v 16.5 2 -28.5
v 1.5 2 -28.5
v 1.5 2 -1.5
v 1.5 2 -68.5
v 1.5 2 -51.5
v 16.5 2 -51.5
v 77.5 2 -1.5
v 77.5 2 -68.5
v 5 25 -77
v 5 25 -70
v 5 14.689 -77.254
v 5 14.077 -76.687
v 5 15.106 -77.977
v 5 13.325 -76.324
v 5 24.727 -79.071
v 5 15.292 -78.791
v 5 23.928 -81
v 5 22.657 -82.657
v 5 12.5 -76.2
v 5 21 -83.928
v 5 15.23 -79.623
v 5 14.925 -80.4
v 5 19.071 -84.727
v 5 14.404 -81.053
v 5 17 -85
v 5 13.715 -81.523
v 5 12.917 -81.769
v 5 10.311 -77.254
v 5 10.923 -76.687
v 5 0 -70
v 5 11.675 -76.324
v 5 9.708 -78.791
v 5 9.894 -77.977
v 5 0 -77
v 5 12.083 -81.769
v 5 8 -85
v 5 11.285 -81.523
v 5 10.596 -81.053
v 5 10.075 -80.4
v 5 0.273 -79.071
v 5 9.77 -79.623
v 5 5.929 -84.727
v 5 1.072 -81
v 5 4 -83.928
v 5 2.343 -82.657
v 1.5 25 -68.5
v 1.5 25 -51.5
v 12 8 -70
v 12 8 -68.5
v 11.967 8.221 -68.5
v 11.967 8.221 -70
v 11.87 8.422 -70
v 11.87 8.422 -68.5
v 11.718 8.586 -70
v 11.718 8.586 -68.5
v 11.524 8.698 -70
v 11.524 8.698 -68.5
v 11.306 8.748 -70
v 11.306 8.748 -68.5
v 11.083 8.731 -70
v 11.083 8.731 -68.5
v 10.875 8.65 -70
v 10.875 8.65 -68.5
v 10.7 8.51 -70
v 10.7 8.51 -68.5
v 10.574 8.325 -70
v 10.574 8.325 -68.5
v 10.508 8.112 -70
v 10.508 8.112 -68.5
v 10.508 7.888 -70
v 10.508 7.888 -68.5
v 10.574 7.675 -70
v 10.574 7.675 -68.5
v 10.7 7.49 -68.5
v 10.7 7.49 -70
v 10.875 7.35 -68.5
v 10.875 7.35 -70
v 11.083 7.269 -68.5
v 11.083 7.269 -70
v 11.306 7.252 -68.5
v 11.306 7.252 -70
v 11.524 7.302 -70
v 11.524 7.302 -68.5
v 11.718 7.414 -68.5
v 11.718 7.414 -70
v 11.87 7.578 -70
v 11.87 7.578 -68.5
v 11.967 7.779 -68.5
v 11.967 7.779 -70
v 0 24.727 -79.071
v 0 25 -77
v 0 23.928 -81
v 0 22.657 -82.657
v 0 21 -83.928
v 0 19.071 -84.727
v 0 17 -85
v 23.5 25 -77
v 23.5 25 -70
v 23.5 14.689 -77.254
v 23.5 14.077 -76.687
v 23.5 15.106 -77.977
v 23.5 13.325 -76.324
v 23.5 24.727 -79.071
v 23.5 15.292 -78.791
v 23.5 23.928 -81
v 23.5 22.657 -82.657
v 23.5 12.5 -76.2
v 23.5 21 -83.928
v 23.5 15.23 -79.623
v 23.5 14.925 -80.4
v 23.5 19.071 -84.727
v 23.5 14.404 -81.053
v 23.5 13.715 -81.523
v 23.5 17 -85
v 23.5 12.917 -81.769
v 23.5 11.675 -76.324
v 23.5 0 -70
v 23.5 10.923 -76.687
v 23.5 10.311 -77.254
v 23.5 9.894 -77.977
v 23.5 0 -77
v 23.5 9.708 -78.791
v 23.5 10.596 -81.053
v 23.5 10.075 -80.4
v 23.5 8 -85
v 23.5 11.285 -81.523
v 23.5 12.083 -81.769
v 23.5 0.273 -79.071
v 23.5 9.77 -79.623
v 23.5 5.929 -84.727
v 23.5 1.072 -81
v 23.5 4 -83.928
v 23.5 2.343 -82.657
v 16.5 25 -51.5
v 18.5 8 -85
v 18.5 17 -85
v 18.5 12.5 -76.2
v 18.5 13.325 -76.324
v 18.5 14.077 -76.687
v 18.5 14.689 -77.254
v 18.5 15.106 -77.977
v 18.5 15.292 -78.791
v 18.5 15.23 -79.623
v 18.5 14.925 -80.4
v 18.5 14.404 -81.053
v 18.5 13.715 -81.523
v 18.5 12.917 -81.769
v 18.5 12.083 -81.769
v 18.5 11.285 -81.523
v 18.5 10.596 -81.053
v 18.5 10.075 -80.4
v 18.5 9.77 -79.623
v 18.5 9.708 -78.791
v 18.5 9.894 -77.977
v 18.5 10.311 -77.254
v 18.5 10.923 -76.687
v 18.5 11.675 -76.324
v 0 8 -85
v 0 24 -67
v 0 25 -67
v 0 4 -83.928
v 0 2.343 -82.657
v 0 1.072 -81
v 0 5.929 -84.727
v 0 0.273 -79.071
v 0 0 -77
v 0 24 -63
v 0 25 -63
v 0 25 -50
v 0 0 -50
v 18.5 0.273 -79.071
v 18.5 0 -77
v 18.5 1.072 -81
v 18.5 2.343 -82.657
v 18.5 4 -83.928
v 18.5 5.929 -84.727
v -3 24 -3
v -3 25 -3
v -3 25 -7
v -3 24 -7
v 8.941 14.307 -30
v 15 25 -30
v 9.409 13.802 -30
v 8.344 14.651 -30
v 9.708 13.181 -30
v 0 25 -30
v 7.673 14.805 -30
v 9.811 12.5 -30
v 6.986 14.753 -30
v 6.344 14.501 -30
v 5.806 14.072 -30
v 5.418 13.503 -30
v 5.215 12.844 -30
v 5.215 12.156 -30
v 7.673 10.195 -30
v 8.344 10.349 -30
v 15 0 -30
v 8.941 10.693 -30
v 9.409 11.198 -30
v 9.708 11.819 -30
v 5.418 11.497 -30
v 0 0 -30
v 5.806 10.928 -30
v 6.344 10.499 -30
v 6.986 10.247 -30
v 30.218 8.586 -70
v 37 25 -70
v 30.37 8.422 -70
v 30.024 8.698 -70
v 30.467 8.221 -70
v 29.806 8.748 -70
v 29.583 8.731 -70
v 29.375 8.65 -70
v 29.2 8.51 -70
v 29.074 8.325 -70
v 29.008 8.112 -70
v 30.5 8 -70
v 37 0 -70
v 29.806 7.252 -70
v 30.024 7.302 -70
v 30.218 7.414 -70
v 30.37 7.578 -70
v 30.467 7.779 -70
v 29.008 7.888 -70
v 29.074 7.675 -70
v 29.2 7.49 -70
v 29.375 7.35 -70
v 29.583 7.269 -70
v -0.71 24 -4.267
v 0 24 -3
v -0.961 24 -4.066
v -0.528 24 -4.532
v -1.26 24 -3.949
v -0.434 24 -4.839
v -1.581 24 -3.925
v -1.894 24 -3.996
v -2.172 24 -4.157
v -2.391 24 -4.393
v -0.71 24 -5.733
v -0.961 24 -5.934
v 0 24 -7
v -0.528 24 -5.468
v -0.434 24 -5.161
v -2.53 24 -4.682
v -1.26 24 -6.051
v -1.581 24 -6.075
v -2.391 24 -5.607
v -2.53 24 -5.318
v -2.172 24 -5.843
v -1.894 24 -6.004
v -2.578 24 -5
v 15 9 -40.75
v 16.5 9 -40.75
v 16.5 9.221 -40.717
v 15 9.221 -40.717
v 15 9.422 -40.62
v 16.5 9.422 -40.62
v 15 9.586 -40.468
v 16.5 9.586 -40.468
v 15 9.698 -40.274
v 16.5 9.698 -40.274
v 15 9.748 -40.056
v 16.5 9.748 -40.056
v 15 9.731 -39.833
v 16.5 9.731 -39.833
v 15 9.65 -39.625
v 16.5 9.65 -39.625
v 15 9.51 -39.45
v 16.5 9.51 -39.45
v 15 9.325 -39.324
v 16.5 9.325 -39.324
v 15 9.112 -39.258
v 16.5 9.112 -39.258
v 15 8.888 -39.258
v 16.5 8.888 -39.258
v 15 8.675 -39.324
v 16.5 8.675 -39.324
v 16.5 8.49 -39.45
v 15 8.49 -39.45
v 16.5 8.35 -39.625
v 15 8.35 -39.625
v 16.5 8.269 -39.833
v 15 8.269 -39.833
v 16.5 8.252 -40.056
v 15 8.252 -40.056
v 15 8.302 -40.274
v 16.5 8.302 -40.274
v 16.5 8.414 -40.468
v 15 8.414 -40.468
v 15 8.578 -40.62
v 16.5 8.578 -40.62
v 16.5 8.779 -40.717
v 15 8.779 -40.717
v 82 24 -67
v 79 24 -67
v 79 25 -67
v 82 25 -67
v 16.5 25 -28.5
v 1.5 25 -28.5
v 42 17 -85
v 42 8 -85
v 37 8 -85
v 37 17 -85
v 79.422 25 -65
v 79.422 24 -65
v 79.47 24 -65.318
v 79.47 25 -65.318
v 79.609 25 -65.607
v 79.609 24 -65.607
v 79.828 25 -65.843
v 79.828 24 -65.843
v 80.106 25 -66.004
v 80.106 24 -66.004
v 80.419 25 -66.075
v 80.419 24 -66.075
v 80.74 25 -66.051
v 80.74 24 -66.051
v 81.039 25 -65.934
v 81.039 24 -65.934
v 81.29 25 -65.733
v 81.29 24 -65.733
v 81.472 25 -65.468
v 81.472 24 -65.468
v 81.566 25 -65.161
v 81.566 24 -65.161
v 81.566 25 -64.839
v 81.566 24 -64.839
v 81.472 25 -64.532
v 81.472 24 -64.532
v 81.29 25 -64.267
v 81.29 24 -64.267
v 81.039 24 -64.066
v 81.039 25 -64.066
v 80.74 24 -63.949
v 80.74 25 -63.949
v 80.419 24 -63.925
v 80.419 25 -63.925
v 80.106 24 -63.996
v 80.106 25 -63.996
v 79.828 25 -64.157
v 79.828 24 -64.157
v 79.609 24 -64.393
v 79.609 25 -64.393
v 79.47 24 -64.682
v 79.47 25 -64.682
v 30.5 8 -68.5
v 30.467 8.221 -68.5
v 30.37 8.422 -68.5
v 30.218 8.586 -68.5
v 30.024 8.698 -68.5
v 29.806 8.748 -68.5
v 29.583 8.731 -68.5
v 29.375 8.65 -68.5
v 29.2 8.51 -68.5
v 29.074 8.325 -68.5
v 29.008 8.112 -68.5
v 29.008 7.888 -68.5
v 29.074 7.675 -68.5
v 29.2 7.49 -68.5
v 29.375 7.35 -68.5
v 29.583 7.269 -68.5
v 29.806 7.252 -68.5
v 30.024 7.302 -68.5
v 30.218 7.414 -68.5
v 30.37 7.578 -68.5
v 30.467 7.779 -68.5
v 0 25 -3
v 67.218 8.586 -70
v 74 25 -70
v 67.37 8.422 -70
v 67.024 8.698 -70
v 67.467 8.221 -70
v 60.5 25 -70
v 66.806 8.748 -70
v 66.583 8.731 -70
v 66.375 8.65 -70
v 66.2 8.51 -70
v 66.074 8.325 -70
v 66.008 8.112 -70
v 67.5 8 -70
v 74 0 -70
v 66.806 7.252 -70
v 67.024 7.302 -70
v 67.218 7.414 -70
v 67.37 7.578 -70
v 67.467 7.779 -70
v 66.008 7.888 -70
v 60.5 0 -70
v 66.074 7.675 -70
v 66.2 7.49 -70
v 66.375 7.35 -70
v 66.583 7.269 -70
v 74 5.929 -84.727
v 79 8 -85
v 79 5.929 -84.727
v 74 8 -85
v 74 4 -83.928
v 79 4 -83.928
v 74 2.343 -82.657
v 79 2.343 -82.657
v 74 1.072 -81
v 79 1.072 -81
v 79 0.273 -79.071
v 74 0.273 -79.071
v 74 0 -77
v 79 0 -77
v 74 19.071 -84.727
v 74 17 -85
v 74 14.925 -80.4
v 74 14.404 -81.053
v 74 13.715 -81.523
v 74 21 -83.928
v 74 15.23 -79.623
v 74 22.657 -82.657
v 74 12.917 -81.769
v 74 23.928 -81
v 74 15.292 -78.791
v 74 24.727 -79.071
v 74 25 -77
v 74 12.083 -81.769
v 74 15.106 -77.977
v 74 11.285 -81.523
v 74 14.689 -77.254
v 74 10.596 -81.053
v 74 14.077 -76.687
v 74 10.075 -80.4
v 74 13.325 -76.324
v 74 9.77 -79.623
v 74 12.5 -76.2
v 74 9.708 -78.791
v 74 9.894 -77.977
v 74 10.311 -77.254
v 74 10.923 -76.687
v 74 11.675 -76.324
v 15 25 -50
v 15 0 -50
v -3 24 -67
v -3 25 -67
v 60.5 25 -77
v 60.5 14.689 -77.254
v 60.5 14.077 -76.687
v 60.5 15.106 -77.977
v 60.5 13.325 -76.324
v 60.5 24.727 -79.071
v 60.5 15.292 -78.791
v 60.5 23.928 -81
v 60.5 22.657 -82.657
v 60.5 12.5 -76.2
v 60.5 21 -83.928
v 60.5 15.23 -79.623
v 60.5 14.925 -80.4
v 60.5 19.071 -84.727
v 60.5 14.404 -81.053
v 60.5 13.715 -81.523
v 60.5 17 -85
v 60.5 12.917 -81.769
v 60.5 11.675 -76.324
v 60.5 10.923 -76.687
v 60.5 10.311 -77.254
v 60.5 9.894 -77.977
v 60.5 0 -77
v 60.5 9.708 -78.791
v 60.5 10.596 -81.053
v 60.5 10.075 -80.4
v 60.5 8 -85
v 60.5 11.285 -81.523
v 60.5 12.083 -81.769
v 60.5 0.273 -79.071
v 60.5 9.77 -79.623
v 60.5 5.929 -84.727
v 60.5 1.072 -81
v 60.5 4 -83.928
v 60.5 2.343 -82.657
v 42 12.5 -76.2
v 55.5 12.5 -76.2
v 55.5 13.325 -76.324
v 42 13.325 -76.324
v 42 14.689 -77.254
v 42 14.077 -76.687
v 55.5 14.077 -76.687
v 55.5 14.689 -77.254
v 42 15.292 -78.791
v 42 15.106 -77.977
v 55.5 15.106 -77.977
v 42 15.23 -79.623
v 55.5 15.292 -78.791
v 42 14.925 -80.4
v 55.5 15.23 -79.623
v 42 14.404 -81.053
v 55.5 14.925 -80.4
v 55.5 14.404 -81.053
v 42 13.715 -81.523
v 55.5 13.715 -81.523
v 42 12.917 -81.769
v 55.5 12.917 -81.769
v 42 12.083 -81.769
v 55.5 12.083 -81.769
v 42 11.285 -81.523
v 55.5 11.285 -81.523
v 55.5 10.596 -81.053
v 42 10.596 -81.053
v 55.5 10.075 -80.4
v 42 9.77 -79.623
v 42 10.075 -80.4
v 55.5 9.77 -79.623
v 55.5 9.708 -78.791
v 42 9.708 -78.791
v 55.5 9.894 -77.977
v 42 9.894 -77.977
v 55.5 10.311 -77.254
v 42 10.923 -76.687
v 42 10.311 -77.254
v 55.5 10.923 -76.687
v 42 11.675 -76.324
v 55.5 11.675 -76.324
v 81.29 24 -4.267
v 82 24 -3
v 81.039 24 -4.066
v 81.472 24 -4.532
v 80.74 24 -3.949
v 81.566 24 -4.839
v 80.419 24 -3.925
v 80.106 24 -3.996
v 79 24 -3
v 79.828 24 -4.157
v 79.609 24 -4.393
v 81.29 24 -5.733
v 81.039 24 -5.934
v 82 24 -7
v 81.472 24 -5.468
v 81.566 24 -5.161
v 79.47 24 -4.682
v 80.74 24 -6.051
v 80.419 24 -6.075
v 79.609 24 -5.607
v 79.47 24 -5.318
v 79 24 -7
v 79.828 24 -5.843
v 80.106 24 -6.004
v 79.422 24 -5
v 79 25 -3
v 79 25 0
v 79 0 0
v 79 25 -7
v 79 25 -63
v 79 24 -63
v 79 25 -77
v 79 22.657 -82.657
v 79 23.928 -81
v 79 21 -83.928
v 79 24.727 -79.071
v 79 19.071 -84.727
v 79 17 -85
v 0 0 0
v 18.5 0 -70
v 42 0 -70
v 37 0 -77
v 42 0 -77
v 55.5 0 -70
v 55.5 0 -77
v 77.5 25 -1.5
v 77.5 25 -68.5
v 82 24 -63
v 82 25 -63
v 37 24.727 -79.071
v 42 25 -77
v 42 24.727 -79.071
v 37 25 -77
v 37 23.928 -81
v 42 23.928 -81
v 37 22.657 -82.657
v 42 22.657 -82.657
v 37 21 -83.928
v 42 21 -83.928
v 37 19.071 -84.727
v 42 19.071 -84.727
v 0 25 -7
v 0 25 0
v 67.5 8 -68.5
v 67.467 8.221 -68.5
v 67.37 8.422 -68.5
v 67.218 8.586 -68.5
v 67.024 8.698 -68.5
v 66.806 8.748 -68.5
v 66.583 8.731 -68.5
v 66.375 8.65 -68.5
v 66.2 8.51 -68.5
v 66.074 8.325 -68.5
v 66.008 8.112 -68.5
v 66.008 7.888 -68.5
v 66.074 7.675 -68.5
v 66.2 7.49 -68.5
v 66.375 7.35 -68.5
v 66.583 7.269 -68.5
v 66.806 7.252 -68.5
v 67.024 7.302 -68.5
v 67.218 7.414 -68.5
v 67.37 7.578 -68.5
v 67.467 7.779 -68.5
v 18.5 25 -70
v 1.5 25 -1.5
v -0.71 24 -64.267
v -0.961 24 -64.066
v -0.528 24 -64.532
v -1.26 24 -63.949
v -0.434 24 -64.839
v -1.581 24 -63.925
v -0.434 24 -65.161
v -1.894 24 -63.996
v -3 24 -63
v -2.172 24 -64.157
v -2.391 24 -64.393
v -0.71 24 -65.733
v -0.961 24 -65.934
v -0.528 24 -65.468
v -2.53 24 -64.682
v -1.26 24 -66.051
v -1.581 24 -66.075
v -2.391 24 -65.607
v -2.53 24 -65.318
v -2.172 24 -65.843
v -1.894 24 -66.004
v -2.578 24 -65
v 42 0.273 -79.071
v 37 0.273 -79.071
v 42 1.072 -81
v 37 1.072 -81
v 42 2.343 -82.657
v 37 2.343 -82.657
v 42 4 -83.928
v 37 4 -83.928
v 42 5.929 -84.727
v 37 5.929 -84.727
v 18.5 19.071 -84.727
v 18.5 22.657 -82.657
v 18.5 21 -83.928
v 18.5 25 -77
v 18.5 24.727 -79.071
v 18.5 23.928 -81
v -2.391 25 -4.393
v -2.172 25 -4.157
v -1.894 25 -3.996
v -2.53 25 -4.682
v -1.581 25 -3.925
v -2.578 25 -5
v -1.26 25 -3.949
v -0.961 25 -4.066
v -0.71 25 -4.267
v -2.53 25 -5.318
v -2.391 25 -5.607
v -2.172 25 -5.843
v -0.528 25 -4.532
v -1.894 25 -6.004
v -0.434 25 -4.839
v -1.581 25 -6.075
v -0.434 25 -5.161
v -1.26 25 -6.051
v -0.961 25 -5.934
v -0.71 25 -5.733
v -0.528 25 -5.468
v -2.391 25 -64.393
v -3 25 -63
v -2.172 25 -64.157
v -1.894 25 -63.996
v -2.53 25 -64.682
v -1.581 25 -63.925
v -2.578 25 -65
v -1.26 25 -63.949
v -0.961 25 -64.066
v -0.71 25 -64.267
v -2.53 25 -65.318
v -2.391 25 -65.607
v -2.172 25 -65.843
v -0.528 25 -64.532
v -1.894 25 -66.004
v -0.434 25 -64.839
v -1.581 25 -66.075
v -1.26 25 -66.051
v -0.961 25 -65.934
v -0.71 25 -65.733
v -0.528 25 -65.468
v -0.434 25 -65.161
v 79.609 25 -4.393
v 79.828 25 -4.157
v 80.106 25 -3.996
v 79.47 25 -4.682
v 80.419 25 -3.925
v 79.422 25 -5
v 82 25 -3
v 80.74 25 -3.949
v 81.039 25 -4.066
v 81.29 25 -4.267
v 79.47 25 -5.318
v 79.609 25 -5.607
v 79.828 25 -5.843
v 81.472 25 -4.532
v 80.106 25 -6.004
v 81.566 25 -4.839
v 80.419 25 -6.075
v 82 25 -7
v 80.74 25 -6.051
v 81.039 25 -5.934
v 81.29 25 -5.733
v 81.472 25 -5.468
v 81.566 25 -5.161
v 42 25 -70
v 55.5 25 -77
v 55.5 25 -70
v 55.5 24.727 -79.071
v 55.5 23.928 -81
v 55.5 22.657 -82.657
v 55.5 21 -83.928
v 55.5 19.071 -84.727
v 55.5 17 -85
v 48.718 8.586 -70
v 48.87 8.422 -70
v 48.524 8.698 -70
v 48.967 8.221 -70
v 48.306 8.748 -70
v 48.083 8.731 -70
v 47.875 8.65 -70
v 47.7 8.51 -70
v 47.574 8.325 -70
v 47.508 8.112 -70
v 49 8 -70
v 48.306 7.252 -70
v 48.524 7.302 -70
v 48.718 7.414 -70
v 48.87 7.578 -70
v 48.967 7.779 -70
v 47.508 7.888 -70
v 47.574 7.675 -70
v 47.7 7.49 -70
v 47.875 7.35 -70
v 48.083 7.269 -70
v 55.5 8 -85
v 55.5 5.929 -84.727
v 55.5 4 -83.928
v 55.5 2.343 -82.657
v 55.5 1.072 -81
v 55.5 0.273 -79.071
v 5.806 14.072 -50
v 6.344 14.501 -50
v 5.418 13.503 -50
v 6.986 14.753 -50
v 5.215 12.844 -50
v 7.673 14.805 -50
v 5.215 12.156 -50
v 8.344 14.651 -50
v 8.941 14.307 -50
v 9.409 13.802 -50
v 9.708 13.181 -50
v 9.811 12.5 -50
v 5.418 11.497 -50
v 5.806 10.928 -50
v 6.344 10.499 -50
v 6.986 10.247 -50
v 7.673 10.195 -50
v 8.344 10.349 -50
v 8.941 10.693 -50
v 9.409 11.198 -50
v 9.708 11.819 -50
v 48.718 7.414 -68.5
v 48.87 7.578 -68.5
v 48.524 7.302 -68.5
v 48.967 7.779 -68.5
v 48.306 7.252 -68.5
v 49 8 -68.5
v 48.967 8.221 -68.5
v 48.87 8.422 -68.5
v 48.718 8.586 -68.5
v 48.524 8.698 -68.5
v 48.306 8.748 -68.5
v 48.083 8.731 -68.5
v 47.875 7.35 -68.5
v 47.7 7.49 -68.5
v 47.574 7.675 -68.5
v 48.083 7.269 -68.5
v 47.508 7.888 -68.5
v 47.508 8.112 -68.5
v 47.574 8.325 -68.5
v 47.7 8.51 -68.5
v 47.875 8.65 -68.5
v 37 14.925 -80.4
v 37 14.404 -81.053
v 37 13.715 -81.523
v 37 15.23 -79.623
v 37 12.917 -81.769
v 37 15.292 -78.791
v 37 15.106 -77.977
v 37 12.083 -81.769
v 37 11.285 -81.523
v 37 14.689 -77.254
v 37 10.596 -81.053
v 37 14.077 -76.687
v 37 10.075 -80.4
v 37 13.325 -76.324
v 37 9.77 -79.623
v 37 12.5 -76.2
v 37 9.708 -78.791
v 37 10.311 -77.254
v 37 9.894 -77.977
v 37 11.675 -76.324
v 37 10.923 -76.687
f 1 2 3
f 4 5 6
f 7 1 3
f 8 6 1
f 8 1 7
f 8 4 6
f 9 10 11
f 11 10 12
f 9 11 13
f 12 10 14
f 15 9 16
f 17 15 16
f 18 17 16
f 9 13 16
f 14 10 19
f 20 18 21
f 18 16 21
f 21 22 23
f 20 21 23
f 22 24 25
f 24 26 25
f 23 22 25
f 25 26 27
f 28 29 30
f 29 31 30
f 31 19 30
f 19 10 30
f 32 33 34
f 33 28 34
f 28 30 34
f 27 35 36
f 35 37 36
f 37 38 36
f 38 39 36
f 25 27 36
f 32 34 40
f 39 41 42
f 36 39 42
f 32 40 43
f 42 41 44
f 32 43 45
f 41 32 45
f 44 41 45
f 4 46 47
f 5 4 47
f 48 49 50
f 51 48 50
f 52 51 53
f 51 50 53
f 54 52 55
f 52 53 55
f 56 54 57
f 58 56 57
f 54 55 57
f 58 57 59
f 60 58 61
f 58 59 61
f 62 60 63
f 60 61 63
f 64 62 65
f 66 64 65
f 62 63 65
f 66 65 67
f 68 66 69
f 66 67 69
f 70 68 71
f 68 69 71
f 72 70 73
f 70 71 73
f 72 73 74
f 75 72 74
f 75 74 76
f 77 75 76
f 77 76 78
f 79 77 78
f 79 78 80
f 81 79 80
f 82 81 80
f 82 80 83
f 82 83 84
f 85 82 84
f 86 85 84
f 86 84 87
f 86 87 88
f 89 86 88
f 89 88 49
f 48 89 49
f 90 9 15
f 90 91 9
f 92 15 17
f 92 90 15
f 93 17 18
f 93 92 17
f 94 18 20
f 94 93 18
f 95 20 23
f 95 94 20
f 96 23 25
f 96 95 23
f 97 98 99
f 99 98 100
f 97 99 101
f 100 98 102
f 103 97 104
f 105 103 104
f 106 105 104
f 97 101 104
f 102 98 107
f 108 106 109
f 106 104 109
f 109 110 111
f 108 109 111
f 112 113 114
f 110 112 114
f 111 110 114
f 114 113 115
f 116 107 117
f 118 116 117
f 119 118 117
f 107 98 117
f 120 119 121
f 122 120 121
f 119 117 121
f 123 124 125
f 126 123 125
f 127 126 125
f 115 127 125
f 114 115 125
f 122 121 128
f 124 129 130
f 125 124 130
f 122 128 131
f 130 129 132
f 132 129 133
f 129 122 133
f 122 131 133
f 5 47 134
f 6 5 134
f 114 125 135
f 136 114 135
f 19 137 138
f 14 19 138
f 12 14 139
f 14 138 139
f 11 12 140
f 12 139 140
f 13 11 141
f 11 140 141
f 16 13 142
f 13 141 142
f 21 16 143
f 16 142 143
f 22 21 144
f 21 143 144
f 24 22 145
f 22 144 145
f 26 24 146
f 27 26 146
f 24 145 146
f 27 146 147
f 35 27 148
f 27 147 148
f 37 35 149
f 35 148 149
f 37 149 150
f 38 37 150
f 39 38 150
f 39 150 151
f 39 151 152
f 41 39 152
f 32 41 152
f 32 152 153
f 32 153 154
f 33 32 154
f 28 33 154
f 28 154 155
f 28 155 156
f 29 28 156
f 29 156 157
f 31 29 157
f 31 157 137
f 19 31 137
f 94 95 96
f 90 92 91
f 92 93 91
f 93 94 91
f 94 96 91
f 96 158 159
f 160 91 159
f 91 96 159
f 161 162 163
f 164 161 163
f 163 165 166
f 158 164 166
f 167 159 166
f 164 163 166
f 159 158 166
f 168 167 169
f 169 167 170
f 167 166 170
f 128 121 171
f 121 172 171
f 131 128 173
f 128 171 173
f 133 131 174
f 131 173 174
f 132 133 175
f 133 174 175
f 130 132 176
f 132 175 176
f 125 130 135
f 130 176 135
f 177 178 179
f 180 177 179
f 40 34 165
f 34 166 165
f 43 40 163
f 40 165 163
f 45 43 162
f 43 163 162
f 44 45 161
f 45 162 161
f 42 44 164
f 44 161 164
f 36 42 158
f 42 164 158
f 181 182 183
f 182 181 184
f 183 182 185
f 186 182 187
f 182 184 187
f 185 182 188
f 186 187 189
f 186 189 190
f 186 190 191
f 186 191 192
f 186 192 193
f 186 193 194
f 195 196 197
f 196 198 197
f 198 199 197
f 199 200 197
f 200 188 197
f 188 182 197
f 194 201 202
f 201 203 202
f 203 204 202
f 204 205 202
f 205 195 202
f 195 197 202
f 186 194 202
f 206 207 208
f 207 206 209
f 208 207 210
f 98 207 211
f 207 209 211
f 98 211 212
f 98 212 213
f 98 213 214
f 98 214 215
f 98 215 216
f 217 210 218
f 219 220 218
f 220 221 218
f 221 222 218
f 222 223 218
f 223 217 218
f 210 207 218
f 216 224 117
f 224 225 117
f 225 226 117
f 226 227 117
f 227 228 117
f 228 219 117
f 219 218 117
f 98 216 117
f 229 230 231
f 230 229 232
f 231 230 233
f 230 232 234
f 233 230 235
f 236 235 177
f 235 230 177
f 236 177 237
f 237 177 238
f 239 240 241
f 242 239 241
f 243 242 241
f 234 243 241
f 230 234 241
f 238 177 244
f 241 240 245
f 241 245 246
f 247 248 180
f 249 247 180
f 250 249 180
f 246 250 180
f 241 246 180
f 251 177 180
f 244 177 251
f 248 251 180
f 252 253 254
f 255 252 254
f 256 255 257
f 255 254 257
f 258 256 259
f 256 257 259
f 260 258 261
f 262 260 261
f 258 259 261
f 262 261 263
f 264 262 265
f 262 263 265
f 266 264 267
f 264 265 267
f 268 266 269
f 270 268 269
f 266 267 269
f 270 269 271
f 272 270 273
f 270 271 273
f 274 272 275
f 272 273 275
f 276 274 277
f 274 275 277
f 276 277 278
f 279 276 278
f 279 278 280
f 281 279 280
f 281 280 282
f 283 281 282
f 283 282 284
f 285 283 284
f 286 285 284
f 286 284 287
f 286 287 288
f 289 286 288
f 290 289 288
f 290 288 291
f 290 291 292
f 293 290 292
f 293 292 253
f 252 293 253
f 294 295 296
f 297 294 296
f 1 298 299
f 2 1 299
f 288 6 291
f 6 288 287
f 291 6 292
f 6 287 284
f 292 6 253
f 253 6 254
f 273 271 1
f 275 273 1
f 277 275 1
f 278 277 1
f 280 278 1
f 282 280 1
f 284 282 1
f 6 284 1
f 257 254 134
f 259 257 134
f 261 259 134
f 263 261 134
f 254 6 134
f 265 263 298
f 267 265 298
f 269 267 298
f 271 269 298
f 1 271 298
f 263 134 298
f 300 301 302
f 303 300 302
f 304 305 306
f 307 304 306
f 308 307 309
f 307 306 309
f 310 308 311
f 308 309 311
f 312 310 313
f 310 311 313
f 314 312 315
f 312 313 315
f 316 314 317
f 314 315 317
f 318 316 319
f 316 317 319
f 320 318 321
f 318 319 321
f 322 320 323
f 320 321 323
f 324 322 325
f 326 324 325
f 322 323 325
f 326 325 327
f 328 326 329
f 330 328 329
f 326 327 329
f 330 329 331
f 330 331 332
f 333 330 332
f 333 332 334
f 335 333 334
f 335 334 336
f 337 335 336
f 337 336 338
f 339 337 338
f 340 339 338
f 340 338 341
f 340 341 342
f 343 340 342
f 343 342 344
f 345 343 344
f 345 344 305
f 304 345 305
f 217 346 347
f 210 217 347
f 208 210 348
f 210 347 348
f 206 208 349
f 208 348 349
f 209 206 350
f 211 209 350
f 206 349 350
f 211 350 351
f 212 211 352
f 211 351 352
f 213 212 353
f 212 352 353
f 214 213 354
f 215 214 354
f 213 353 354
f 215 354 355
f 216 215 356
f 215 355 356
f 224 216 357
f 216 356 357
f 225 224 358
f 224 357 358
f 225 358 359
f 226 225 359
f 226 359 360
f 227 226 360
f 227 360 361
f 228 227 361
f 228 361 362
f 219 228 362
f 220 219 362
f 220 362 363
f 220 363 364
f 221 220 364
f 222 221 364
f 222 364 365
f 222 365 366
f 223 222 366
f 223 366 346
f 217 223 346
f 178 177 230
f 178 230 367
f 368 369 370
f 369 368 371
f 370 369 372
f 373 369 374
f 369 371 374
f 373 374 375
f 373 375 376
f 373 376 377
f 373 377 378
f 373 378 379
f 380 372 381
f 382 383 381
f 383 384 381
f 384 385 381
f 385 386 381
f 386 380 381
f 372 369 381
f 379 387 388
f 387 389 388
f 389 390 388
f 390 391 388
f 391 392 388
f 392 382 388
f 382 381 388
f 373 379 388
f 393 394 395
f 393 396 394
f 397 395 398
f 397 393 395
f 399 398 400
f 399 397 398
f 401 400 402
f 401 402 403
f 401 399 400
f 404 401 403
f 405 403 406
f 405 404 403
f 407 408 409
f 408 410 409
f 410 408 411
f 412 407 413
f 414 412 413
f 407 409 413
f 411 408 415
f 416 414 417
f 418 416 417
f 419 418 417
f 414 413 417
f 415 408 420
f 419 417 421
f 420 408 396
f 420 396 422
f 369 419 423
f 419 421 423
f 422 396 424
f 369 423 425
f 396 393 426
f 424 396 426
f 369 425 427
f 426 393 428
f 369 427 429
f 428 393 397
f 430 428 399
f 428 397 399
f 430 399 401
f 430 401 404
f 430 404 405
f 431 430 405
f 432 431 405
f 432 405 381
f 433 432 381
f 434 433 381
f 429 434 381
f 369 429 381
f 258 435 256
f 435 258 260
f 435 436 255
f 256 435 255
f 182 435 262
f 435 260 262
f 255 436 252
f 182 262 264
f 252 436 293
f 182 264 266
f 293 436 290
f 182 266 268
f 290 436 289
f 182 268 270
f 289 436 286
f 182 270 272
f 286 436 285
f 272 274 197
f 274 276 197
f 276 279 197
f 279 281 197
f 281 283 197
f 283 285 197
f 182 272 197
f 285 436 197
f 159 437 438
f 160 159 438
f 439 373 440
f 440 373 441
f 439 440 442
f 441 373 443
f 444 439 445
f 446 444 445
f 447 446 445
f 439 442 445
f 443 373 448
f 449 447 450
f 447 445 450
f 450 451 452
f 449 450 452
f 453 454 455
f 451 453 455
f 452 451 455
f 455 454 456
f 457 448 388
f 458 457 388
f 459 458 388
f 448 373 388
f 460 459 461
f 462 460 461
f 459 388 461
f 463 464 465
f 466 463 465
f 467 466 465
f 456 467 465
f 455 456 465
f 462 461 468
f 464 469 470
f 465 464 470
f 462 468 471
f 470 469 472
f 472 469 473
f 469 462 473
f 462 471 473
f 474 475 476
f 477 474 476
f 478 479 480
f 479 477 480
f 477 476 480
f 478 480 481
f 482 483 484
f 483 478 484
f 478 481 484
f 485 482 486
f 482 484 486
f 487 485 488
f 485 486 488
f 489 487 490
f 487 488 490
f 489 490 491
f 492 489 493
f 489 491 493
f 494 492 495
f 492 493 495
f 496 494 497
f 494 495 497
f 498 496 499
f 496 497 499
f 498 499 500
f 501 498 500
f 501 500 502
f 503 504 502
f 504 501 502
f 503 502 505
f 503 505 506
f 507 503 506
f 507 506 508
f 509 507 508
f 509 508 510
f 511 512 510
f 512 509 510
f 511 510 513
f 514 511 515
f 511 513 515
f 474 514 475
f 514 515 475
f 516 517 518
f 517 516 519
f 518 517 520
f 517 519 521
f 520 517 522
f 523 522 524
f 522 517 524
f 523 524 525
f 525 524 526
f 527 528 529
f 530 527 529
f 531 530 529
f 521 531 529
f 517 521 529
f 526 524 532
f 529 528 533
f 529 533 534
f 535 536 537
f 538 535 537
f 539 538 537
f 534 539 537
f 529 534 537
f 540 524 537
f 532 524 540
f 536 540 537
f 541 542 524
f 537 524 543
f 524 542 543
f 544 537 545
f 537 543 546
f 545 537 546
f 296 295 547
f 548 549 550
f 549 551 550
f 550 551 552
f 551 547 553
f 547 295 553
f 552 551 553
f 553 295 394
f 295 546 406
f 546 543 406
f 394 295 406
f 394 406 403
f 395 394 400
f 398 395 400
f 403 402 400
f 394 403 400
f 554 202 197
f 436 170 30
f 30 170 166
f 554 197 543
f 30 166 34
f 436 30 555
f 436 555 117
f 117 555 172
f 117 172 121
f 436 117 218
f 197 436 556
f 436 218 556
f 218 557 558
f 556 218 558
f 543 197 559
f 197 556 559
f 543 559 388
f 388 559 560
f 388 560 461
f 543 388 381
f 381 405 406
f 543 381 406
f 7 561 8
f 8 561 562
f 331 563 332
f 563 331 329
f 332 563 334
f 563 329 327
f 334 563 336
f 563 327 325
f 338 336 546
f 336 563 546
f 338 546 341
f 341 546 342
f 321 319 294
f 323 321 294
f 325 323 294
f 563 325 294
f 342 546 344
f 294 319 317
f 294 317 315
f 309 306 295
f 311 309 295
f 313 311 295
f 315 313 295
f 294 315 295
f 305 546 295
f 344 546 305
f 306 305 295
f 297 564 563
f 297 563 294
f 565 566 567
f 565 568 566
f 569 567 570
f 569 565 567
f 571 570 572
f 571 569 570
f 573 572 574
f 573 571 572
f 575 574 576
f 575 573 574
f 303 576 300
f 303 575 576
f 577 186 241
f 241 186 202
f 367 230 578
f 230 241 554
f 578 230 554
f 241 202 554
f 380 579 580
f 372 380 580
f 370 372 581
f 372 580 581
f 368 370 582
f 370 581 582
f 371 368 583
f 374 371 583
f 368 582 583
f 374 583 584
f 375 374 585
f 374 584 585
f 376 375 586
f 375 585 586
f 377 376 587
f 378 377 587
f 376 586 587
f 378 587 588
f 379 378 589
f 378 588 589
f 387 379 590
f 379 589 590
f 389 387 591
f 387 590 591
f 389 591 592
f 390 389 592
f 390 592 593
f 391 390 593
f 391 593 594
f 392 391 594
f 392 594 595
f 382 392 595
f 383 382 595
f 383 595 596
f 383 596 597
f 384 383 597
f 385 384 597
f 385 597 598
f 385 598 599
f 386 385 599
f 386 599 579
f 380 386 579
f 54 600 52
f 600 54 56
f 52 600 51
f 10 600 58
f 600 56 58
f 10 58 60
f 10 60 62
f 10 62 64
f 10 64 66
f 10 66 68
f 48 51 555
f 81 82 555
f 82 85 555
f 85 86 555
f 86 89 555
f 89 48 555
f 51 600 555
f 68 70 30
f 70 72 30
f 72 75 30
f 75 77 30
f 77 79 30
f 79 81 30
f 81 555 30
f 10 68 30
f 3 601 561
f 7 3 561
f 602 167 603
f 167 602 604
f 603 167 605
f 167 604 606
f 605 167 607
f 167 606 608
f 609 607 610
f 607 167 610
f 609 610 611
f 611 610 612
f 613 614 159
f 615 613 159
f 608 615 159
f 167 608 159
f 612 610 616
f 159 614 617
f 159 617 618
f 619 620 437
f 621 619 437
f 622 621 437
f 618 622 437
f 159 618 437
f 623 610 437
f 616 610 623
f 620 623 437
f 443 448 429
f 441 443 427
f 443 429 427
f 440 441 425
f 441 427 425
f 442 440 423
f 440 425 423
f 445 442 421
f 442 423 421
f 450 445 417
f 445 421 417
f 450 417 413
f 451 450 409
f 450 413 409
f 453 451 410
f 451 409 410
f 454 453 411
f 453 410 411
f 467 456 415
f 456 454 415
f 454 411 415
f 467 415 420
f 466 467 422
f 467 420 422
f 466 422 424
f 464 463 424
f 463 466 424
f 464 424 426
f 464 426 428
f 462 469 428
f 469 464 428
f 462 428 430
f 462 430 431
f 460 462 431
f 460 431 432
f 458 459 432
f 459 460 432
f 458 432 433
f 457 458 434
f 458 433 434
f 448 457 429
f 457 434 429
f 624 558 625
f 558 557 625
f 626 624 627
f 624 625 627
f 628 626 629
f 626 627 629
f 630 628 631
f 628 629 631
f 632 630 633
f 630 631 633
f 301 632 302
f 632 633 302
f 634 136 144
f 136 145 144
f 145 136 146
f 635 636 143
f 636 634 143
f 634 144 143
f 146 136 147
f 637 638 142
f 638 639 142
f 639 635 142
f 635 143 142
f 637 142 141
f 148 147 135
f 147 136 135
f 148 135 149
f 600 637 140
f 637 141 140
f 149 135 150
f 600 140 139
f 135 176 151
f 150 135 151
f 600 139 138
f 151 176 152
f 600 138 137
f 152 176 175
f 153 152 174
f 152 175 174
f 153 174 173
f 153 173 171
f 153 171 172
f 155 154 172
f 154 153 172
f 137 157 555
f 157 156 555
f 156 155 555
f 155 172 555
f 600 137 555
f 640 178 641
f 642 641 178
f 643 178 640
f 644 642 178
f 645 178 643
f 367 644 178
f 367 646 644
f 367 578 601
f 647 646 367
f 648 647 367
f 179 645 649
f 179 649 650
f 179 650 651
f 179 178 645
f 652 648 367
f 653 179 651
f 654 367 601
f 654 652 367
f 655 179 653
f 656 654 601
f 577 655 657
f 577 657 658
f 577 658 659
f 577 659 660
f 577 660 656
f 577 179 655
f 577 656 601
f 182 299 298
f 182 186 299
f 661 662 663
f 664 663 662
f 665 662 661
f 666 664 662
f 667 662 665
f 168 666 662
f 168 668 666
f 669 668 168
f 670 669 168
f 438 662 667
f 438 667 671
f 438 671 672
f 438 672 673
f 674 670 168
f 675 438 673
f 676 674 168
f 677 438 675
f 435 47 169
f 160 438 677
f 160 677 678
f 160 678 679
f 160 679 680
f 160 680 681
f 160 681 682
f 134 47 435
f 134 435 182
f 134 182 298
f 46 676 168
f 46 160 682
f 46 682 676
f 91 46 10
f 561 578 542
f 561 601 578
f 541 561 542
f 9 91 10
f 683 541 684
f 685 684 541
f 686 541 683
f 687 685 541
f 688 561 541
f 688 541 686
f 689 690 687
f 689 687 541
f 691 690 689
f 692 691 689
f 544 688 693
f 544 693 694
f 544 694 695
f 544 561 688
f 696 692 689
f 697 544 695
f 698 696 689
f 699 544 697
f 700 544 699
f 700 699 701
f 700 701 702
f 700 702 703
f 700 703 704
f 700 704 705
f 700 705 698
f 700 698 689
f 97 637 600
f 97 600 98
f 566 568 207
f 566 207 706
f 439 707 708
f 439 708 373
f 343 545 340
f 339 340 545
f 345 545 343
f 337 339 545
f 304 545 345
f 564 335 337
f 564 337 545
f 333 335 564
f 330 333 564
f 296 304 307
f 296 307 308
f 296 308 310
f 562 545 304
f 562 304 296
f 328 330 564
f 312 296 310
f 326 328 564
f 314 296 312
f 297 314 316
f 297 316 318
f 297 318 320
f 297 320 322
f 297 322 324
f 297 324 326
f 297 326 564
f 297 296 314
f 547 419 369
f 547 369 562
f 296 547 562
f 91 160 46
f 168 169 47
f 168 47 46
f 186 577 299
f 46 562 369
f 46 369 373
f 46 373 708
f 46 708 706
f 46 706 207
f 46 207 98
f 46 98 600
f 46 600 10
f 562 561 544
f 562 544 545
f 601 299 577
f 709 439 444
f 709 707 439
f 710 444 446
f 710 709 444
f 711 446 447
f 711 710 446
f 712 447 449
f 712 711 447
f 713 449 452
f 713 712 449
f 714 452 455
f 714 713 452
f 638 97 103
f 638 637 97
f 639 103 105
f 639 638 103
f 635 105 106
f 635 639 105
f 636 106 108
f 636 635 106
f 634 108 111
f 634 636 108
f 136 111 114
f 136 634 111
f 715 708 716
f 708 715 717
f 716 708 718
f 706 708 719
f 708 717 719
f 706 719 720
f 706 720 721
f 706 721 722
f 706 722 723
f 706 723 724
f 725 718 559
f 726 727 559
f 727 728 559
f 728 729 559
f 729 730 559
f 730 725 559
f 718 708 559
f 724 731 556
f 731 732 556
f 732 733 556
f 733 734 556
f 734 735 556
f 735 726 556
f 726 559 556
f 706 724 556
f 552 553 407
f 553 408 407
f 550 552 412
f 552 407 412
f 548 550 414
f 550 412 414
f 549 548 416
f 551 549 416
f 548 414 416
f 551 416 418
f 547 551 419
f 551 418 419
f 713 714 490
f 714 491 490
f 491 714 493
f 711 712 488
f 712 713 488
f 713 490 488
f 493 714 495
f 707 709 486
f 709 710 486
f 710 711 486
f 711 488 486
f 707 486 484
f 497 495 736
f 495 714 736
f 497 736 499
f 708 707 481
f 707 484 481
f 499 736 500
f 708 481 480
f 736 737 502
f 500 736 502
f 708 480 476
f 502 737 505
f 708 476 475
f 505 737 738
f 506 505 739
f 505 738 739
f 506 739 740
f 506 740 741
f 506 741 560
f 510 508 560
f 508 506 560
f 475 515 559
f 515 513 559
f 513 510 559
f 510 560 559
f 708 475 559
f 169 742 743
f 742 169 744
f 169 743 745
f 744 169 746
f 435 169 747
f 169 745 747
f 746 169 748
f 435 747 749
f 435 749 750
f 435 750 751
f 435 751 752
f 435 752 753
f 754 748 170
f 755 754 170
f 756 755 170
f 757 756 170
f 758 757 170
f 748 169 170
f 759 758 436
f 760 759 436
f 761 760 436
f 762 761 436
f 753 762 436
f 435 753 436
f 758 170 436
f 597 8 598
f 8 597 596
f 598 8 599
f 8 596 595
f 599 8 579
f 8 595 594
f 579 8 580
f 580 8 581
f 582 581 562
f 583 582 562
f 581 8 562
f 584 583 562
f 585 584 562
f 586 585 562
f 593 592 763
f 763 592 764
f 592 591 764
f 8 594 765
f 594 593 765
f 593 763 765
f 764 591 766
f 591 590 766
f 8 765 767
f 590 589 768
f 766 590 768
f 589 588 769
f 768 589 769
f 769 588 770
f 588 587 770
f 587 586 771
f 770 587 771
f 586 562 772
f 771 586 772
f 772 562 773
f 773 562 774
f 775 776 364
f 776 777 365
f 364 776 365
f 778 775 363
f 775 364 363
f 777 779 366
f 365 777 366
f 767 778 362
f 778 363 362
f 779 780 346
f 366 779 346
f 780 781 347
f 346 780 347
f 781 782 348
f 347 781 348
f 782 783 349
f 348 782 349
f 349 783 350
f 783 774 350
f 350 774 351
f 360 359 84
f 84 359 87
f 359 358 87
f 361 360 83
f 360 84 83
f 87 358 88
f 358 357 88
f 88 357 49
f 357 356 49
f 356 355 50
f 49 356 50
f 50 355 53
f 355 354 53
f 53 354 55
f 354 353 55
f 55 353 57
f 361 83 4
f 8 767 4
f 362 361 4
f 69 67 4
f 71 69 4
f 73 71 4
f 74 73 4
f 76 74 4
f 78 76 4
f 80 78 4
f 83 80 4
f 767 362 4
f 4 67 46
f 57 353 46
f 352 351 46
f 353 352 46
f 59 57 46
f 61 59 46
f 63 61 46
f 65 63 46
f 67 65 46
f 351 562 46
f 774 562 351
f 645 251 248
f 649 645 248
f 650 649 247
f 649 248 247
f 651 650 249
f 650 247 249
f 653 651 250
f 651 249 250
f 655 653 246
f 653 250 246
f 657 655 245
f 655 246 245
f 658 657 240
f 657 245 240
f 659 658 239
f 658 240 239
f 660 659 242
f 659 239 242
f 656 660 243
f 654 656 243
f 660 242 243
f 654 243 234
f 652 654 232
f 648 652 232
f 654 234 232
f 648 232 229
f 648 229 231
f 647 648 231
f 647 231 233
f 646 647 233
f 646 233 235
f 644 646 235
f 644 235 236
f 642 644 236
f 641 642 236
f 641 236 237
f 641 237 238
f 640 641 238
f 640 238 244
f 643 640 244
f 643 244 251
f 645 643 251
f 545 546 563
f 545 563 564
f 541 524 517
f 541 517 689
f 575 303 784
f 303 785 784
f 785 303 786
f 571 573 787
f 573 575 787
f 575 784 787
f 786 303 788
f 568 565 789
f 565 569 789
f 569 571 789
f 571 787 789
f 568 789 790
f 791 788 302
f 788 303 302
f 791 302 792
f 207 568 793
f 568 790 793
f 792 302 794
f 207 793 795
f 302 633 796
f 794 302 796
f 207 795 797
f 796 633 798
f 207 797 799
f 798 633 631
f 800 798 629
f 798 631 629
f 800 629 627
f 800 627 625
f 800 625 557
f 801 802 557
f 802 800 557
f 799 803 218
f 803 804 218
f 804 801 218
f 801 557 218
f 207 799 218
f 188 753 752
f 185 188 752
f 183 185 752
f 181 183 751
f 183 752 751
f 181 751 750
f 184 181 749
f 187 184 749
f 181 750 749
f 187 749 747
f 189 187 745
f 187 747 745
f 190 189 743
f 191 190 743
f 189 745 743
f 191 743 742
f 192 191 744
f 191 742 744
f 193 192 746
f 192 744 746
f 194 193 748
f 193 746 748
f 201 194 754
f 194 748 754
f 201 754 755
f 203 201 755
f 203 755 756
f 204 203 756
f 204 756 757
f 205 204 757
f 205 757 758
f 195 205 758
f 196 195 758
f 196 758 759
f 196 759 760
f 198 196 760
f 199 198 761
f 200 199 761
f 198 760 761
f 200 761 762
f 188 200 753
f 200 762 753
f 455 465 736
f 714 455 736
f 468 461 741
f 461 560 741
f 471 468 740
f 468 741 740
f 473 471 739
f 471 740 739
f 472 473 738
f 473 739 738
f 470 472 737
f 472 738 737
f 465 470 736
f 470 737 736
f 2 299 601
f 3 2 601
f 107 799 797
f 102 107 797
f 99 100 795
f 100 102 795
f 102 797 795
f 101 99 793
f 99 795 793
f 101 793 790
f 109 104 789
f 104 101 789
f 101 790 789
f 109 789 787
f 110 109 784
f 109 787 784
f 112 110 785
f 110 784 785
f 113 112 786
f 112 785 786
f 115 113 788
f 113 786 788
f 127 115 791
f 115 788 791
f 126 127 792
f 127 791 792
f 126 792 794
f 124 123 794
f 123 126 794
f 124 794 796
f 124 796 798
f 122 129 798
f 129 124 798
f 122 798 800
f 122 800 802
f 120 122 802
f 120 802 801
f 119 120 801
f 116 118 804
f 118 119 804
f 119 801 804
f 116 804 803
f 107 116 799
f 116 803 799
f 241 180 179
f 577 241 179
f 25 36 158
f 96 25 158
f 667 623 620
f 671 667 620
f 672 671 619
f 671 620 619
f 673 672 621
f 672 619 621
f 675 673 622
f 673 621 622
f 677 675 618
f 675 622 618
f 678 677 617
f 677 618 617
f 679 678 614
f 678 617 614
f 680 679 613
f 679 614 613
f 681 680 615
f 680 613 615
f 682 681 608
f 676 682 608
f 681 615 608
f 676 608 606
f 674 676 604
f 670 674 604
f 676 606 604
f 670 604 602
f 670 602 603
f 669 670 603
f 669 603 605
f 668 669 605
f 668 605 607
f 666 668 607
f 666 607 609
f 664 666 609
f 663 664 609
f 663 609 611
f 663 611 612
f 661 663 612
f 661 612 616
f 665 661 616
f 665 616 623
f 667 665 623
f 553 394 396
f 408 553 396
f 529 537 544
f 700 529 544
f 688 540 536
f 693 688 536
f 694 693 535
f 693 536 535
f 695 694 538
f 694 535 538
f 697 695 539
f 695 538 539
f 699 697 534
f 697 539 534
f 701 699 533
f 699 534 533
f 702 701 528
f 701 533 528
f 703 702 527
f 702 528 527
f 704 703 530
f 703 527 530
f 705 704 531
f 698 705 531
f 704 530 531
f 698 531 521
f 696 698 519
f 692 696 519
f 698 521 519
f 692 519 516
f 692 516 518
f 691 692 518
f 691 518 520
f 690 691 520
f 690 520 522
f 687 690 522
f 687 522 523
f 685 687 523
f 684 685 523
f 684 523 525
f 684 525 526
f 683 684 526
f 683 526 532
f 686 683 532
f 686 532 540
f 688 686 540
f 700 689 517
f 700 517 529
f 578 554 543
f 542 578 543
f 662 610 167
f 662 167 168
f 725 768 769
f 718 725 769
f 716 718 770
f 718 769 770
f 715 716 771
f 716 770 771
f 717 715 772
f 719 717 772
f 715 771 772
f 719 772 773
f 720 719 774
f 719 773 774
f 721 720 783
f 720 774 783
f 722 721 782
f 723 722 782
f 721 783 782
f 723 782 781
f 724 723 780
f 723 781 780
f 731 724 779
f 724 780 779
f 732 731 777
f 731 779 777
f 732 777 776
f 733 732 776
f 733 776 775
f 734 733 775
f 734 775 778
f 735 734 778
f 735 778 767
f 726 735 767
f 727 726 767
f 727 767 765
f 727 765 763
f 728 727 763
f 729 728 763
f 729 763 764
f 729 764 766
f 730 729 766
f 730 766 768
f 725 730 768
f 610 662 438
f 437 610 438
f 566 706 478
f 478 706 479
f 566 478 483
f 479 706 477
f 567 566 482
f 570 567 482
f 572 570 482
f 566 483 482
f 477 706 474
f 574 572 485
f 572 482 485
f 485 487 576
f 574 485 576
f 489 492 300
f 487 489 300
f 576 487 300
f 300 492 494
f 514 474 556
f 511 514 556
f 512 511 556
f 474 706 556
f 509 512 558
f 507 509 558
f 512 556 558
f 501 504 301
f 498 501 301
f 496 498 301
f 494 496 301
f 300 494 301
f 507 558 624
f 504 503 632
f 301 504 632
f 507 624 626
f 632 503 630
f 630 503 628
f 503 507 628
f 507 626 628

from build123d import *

# Parameters (mm, degrees)
BOSS_EXTRUDE1_DEPTH  = 25
SKETCH3_R            = 2.8
BOSS_EXTRUDE2_DEPTH  = 69
CUT_EXTRUDE2_DEPTH   = 23
SKETCH9_R            = 2.311028434
BOSS_EXTRUDE3_DEPTH  = 20
FILLET1_R            = 8
SKETCH10_R           = 0.75
CUT_EXTRUDE4_DEPTH   = 2
LPATTERN2_COUNT      = 2
LPATTERN2_PITCH      = 2
LPATTERN2_COUNT_DIR2 = 4
LPATTERN2_PITCH_DIR2 = 18.5
SKETCH11_R           = 0.75
CUT_EXTRUDE5_DEPTH   = 2
SKETCH13_W           = 4
SKETCH13_H           = 1
BOSS_EXTRUDE4_DEPTH  = 3
SKETCH14_R           = 1.078343224
CUT_EXTRUDE6_DEPTH   = 2
LPATTERN3_COUNT      = 2
LPATTERN3_PITCH      = 60
LPATTERN3_COUNT_DIR2 = 2
LPATTERN3_PITCH_DIR2 = 82
LPATTERN4_COUNT      = 2
LPATTERN4_PITCH      = 60
LPATTERN4_COUNT_DIR2 = 2
LPATTERN4_PITCH_DIR2 = 82


with BuildPart() as part:
    # Sketch2 → Boss-Extrude1 (new body)
    with BuildSketch(Plane(origin=(0, 0, 0), x_dir=(1, 0, 0), z_dir=(0, 1, 0))):
        Polygon((0, 0), (79, 0), (79, 85), (74, 85), (74, 70), (60.5, 70), (60.5, 85), (55.5, 85), (55.5, 70), (42, 70), (42, 85), (37, 85), (37, 70), (23.5, 70), (23.5, 85), (18.5, 85), (18.5, 70), (5, 70), (5, 85), (0, 85), (0, 50), (15, 50), (15, 30), (0, 30), align=None)
    extrude(amount=BOSS_EXTRUDE1_DEPTH)

    # Sketch3 → Boss-Extrude2 (add)
    with BuildSketch(Plane.ZY.offset(-74)):
        with Locations((-79, 12.5)):
            Circle(SKETCH3_R)
    extrude(amount=BOSS_EXTRUDE2_DEPTH)

    # Sketch4 → Cut-Extrude2 (cut)
    with BuildSketch(Plane(origin=(0, 25, 0), x_dir=(1, 0, 0), z_dir=(0, 1, 0))):
        Polygon((1.5, 68.5), (1.5, 51.5), (16.5, 51.5), (16.5, 28.5), (1.5, 28.5), (1.5, 1.5), (77.5, 1.5), (77.5, 68.5), align=None)
    extrude(amount=-CUT_EXTRUDE2_DEPTH, mode=Mode.SUBTRACT)

    # Sketch9 → Boss-Extrude3 (add)
    with BuildSketch(Plane.XY.offset(-50)):
        with Locations((7.5, 12.5)):
            Circle(SKETCH9_R)
    extrude(amount=BOSS_EXTRUDE3_DEPTH)

    # Fillet1
    fillet1_edges = [part.edges().sort_by_distance(p)[0] for p in [
        (76.5, 25, -85),
        (2.5, 0, -85),
        (21, 0, -85),
        (39.5, 0, -85),
        (58, 0, -85),
        (76.5, 0, -85),
        (58, 25, -85),
        (39.5, 25, -85),
        (21, 25, -85),
        (2.5, 25, -85),
    ]]
    fillet(fillet1_edges, radius=FILLET1_R)

    # Sketch10 → Cut-Extrude4 (cut)
    with BuildSketch(Plane.XY.offset(-68.5)):
        with Locations((11.25, 8)):
            Circle(SKETCH10_R)
    cut_extrude4 = extrude(amount=-CUT_EXTRUDE4_DEPTH, mode=Mode.SUBTRACT)

    # LPattern2: Cut-Extrude4 2 × 4
    with Locations(*[(j * LPATTERN2_PITCH_DIR2, 0, i * LPATTERN2_PITCH) for i in range(LPATTERN2_COUNT) for j in range(LPATTERN2_COUNT_DIR2) if (i, j) != (0, 0)]):
        add(cut_extrude4, mode=Mode.SUBTRACT)

    # Sketch11 → Cut-Extrude5 (cut)
    with BuildSketch(Plane(origin=(16.5, 0, 0), x_dir=(0, 0, -1), z_dir=(1, 0, 0))):
        with Locations((40, 9)):
            Circle(SKETCH11_R)
    extrude(amount=-CUT_EXTRUDE5_DEPTH, mode=Mode.SUBTRACT)

    # Sketch13 → Boss-Extrude4 (add)
    with BuildSketch(Plane(origin=(79, 0, 0), x_dir=(0, 0, -1), z_dir=(1, 0, 0))):
        with Locations((5, 24.5)):
            Rectangle(SKETCH13_W, SKETCH13_H)
    boss_extrude4 = extrude(amount=BOSS_EXTRUDE4_DEPTH)

    # Sketch14 → Cut-Extrude6 (cut, through all)
    with BuildSketch(Plane(origin=(0, 24, 0), x_dir=(-1, 0, 0), z_dir=(0, -1, 0))):
        with Locations((-80.5, 5)):
            Circle(SKETCH14_R)
    cut_extrude6 = extrude(amount=-CUT_EXTRUDE6_DEPTH, mode=Mode.SUBTRACT)

    # LPattern3: Boss-Extrude4 2 × 2
    with Locations(*[(-j * LPATTERN3_PITCH_DIR2, 0, -i * LPATTERN3_PITCH) for i in range(LPATTERN3_COUNT) for j in range(LPATTERN3_COUNT_DIR2) if (i, j) != (0, 0)]):
        add(boss_extrude4)

    # LPattern4: Cut-Extrude6 2 × 2
    with Locations(*[(-j * LPATTERN4_PITCH_DIR2, 0, -i * LPATTERN4_PITCH) for i in range(LPATTERN4_COUNT) for j in range(LPATTERN4_COUNT_DIR2) if (i, j) != (0, 0)]):
        add(cut_extrude6, mode=Mode.SUBTRACT)


solid = part.part
